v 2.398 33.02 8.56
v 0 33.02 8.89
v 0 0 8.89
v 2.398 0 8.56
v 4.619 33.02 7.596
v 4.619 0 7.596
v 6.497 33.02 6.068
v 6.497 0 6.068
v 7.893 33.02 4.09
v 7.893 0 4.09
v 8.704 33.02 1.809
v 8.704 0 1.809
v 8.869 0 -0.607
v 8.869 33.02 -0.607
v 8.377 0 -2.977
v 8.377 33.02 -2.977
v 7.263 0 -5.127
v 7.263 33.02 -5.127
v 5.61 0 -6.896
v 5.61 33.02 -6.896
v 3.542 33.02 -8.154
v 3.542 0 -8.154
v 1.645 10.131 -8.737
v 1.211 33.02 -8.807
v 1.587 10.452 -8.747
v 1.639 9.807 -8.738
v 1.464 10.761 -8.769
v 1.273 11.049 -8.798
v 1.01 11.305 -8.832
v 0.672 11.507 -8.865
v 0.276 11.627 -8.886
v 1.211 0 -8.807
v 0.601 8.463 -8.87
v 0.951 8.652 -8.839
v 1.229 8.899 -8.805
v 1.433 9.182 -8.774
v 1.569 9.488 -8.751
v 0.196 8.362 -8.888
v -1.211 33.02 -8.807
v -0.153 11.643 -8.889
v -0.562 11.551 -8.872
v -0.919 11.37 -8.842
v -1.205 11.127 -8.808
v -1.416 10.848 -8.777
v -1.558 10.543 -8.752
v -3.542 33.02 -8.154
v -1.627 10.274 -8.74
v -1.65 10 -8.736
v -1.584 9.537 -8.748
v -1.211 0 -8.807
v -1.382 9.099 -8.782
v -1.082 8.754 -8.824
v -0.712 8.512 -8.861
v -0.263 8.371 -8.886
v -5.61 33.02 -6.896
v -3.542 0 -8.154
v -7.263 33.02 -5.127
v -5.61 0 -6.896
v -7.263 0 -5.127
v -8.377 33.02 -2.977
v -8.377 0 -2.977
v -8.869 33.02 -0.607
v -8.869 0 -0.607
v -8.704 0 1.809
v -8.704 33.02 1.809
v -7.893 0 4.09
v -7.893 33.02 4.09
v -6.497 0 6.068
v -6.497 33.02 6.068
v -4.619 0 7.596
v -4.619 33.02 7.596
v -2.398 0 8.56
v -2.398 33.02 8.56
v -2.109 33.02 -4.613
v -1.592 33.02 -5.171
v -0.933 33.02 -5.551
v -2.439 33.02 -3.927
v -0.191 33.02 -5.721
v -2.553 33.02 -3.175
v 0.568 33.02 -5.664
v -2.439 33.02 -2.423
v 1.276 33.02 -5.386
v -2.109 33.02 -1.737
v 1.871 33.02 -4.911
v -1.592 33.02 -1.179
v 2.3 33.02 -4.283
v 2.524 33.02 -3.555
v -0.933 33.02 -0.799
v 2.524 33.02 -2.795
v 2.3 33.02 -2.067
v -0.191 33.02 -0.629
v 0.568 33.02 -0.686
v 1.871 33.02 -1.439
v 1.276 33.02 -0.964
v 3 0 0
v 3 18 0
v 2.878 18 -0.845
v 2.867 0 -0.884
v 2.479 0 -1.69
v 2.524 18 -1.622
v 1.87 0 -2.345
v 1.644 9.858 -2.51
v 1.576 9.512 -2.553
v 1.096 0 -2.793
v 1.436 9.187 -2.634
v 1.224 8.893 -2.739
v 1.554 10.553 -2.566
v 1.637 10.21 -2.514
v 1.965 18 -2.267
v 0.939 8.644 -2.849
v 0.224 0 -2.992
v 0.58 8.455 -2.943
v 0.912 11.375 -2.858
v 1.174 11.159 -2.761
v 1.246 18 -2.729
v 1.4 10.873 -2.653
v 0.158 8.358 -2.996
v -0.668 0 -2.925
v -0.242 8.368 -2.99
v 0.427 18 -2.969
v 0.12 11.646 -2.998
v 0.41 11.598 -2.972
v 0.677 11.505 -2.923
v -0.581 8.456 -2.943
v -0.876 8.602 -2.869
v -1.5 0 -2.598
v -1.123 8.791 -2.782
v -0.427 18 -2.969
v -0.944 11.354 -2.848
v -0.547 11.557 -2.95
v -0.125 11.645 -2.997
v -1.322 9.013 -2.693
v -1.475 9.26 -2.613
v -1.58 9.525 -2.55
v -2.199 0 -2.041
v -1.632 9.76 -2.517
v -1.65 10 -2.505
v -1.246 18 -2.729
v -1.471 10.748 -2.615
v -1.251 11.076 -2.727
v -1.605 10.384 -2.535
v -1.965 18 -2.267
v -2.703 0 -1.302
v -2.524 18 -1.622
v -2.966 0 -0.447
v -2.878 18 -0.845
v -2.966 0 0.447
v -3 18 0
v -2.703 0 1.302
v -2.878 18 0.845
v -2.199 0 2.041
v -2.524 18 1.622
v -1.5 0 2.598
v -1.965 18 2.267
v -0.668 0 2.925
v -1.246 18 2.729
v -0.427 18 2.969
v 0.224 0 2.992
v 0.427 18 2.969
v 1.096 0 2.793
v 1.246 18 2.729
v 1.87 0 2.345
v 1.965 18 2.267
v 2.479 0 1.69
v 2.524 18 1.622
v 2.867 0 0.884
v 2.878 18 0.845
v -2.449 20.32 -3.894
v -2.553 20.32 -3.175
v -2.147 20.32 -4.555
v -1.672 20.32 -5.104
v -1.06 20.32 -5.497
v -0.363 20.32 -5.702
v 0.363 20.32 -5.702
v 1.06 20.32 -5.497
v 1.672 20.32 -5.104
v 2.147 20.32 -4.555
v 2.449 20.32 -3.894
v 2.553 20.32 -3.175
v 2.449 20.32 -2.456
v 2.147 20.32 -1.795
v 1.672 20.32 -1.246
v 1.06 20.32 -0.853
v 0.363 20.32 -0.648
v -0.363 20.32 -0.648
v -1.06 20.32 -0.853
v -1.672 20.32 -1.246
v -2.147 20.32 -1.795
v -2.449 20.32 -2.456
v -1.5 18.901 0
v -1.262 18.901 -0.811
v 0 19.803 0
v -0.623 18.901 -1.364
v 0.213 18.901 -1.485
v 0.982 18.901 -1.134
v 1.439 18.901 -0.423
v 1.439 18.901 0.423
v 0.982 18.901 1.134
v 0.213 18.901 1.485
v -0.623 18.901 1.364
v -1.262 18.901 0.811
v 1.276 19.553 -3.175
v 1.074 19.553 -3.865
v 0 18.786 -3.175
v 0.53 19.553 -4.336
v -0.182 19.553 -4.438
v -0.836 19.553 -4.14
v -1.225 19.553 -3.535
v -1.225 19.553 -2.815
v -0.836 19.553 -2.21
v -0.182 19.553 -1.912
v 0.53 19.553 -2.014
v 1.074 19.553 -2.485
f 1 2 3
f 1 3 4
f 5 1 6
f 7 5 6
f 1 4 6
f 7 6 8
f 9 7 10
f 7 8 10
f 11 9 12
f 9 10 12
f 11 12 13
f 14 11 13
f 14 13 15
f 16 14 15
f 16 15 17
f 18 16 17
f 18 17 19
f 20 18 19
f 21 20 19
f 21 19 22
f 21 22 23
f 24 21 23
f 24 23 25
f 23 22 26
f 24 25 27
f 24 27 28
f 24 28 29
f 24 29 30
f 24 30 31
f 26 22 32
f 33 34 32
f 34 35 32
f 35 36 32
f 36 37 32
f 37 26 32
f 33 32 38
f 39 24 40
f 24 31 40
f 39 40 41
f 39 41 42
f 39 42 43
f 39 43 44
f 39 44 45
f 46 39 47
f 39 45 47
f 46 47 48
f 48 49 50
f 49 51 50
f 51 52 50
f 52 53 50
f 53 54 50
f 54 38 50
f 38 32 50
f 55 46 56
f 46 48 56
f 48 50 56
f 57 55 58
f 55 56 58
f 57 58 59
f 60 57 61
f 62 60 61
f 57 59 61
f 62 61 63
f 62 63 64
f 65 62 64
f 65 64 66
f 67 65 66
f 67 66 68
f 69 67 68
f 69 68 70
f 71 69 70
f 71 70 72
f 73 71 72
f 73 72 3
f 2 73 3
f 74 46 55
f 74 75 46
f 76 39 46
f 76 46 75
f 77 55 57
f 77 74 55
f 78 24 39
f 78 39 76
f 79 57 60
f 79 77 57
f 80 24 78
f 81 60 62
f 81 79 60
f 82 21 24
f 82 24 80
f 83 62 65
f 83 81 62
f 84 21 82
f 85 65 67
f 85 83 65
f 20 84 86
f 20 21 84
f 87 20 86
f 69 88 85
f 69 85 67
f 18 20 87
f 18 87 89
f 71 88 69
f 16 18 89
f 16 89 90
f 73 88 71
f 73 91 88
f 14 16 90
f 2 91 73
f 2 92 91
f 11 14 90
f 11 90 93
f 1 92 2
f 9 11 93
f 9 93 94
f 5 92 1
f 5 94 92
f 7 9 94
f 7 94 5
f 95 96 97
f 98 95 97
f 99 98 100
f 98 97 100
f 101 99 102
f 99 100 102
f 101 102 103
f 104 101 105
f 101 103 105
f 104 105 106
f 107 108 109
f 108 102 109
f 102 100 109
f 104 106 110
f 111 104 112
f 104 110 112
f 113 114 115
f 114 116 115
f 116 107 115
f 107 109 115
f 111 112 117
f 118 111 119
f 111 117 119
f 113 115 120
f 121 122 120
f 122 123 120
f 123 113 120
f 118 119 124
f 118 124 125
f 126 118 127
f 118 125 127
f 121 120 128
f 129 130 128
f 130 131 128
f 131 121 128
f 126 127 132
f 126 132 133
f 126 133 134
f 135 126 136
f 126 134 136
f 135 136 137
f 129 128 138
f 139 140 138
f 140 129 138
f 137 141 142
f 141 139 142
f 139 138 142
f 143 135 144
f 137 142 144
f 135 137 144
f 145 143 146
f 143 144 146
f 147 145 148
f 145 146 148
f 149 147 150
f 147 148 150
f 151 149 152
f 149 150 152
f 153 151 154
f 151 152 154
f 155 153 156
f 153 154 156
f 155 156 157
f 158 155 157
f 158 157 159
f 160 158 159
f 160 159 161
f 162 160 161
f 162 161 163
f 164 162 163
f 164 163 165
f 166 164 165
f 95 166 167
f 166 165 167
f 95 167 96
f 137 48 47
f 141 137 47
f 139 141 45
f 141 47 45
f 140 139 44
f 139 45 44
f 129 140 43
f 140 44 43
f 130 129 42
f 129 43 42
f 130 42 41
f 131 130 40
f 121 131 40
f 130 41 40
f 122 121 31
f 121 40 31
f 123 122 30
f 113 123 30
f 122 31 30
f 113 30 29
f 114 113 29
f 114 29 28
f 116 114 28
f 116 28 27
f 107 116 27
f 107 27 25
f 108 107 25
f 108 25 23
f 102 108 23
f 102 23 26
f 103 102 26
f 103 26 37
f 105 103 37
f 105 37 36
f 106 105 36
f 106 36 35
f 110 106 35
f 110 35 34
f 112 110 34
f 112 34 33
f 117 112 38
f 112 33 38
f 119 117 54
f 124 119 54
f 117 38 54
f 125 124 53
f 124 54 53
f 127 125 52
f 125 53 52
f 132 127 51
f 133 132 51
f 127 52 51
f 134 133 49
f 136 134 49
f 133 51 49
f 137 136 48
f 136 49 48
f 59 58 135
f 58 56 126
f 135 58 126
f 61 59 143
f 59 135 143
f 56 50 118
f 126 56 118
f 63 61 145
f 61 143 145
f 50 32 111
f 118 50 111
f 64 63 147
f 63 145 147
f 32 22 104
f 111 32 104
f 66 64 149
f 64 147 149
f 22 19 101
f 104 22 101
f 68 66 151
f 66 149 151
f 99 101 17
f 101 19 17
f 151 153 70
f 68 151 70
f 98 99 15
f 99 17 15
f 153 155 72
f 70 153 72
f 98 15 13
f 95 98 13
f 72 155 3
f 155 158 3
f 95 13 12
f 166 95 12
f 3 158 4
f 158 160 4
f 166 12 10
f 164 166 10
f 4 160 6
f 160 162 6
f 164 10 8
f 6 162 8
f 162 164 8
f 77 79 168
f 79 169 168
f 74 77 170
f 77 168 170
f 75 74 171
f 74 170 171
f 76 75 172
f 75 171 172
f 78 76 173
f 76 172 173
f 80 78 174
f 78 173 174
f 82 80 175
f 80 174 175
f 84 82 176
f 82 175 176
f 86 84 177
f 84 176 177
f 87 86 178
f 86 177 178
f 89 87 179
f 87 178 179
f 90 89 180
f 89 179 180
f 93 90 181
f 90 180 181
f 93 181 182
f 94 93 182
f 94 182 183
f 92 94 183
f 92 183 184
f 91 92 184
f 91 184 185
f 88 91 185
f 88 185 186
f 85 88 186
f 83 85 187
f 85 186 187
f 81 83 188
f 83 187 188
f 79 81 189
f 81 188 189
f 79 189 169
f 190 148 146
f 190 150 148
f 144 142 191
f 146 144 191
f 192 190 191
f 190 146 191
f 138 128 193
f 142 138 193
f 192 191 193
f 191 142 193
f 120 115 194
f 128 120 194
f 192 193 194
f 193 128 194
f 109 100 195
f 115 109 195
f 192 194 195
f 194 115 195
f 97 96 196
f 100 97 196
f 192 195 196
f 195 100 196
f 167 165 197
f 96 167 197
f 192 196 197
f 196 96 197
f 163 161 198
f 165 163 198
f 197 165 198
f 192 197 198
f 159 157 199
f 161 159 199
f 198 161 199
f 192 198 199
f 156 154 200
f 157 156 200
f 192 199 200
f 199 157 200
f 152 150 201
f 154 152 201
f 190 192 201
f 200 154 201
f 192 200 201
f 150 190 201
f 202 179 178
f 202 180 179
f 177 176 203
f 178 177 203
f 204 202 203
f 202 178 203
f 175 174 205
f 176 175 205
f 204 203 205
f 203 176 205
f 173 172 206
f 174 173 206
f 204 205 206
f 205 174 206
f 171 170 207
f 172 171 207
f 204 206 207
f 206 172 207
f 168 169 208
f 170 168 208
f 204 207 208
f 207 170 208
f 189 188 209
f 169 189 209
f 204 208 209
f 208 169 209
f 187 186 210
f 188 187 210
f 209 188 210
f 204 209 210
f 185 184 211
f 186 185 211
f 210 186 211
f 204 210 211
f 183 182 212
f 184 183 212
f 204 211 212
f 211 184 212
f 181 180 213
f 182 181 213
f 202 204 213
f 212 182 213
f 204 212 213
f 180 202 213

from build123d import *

# Parameters (mm, degrees)
SKETCH1_R                   = 8.89
BOSS_EXTRUDE1_DEPTH         = 33.02
F_1_4_20_TAPPED_HOLE1_D     = 5.1054
F_1_4_20_TAPPED_HOLE1_DEPTH = 12.7
F_1_4_20_TAPPED_HOLE1_TIP   = 1.533816902
F_6_0MM_DOWEL_HOLE1_D       = 6
F_6_0MM_DOWEL_HOLE1_DEPTH   = 17.9999894
F_6_0MM_DOWEL_HOLE1_TIP     = 1.802581857
M4X0_7_TAPPED_HOLE1_REACH   = 40.542
M4X0_7_TAPPED_HOLE1_BORE_R  = 1.65


with BuildPart() as part:
    # Sketch1 → Boss-Extrude1 (new body)
    with BuildSketch(Plane(origin=(0, 0, 0), x_dir=(1, 0, 0), z_dir=(0, 1, 0))):
        with Locations(Location((0, 0, 0), (0, 0, 270))):
            Circle(SKETCH1_R)
    extrude(amount=BOSS_EXTRUDE1_DEPTH)

    # 1/4-20 Tapped Hole1
    with Locations(Plane(origin=(0, 33.02, 0), x_dir=(1, 0, 0), z_dir=(0, 1, 0))):
        with Locations((0, 3.175)):
            Hole(F_1_4_20_TAPPED_HOLE1_D / 2, depth=F_1_4_20_TAPPED_HOLE1_DEPTH)
            with Locations((0, 0, -(F_1_4_20_TAPPED_HOLE1_DEPTH + F_1_4_20_TAPPED_HOLE1_TIP / 2))):  # 118° drill point
                Cone(0, F_1_4_20_TAPPED_HOLE1_D / 2, F_1_4_20_TAPPED_HOLE1_TIP, mode=Mode.SUBTRACT)

    # Ø6.0mm Dowel Hole1
    with Locations(Plane(origin=(0, 0, 0), x_dir=(-1, 0, 0), z_dir=(0, -1, 0))):
        with Locations((0, 0)):
            Hole(F_6_0MM_DOWEL_HOLE1_D / 2, depth=F_6_0MM_DOWEL_HOLE1_DEPTH)
            with Locations((0, 0, -(F_6_0MM_DOWEL_HOLE1_DEPTH + F_6_0MM_DOWEL_HOLE1_TIP / 2))):  # 118° drill point
                Cone(0, F_6_0MM_DOWEL_HOLE1_D / 2, F_6_0MM_DOWEL_HOLE1_TIP, mode=Mode.SUBTRACT)

    # M4x0.7 Tapped Hole1 bore → M4x0.7 Tapped Hole1 (cut, up to next)
    with BuildSketch(Plane(origin=(0, 0, -8.89), x_dir=(-1, 0, 0), z_dir=(0, 0, -1)), mode=Mode.PRIVATE) as m4x0_7_tapped_hole1_sk1:
        with Locations((0, 10)):
            Circle(M4X0_7_TAPPED_HOLE1_BORE_R)
    m4x0_7_tapped_hole1_tool1 = extrude(m4x0_7_tapped_hole1_sk1.sketch, amount=-M4X0_7_TAPPED_HOLE1_REACH, mode=Mode.PRIVATE) & part.part
    add(m4x0_7_tapped_hole1_tool1.solids().sort_by_distance((0, 10, -8.89))[0], mode=Mode.SUBTRACT)


solid = part.part
